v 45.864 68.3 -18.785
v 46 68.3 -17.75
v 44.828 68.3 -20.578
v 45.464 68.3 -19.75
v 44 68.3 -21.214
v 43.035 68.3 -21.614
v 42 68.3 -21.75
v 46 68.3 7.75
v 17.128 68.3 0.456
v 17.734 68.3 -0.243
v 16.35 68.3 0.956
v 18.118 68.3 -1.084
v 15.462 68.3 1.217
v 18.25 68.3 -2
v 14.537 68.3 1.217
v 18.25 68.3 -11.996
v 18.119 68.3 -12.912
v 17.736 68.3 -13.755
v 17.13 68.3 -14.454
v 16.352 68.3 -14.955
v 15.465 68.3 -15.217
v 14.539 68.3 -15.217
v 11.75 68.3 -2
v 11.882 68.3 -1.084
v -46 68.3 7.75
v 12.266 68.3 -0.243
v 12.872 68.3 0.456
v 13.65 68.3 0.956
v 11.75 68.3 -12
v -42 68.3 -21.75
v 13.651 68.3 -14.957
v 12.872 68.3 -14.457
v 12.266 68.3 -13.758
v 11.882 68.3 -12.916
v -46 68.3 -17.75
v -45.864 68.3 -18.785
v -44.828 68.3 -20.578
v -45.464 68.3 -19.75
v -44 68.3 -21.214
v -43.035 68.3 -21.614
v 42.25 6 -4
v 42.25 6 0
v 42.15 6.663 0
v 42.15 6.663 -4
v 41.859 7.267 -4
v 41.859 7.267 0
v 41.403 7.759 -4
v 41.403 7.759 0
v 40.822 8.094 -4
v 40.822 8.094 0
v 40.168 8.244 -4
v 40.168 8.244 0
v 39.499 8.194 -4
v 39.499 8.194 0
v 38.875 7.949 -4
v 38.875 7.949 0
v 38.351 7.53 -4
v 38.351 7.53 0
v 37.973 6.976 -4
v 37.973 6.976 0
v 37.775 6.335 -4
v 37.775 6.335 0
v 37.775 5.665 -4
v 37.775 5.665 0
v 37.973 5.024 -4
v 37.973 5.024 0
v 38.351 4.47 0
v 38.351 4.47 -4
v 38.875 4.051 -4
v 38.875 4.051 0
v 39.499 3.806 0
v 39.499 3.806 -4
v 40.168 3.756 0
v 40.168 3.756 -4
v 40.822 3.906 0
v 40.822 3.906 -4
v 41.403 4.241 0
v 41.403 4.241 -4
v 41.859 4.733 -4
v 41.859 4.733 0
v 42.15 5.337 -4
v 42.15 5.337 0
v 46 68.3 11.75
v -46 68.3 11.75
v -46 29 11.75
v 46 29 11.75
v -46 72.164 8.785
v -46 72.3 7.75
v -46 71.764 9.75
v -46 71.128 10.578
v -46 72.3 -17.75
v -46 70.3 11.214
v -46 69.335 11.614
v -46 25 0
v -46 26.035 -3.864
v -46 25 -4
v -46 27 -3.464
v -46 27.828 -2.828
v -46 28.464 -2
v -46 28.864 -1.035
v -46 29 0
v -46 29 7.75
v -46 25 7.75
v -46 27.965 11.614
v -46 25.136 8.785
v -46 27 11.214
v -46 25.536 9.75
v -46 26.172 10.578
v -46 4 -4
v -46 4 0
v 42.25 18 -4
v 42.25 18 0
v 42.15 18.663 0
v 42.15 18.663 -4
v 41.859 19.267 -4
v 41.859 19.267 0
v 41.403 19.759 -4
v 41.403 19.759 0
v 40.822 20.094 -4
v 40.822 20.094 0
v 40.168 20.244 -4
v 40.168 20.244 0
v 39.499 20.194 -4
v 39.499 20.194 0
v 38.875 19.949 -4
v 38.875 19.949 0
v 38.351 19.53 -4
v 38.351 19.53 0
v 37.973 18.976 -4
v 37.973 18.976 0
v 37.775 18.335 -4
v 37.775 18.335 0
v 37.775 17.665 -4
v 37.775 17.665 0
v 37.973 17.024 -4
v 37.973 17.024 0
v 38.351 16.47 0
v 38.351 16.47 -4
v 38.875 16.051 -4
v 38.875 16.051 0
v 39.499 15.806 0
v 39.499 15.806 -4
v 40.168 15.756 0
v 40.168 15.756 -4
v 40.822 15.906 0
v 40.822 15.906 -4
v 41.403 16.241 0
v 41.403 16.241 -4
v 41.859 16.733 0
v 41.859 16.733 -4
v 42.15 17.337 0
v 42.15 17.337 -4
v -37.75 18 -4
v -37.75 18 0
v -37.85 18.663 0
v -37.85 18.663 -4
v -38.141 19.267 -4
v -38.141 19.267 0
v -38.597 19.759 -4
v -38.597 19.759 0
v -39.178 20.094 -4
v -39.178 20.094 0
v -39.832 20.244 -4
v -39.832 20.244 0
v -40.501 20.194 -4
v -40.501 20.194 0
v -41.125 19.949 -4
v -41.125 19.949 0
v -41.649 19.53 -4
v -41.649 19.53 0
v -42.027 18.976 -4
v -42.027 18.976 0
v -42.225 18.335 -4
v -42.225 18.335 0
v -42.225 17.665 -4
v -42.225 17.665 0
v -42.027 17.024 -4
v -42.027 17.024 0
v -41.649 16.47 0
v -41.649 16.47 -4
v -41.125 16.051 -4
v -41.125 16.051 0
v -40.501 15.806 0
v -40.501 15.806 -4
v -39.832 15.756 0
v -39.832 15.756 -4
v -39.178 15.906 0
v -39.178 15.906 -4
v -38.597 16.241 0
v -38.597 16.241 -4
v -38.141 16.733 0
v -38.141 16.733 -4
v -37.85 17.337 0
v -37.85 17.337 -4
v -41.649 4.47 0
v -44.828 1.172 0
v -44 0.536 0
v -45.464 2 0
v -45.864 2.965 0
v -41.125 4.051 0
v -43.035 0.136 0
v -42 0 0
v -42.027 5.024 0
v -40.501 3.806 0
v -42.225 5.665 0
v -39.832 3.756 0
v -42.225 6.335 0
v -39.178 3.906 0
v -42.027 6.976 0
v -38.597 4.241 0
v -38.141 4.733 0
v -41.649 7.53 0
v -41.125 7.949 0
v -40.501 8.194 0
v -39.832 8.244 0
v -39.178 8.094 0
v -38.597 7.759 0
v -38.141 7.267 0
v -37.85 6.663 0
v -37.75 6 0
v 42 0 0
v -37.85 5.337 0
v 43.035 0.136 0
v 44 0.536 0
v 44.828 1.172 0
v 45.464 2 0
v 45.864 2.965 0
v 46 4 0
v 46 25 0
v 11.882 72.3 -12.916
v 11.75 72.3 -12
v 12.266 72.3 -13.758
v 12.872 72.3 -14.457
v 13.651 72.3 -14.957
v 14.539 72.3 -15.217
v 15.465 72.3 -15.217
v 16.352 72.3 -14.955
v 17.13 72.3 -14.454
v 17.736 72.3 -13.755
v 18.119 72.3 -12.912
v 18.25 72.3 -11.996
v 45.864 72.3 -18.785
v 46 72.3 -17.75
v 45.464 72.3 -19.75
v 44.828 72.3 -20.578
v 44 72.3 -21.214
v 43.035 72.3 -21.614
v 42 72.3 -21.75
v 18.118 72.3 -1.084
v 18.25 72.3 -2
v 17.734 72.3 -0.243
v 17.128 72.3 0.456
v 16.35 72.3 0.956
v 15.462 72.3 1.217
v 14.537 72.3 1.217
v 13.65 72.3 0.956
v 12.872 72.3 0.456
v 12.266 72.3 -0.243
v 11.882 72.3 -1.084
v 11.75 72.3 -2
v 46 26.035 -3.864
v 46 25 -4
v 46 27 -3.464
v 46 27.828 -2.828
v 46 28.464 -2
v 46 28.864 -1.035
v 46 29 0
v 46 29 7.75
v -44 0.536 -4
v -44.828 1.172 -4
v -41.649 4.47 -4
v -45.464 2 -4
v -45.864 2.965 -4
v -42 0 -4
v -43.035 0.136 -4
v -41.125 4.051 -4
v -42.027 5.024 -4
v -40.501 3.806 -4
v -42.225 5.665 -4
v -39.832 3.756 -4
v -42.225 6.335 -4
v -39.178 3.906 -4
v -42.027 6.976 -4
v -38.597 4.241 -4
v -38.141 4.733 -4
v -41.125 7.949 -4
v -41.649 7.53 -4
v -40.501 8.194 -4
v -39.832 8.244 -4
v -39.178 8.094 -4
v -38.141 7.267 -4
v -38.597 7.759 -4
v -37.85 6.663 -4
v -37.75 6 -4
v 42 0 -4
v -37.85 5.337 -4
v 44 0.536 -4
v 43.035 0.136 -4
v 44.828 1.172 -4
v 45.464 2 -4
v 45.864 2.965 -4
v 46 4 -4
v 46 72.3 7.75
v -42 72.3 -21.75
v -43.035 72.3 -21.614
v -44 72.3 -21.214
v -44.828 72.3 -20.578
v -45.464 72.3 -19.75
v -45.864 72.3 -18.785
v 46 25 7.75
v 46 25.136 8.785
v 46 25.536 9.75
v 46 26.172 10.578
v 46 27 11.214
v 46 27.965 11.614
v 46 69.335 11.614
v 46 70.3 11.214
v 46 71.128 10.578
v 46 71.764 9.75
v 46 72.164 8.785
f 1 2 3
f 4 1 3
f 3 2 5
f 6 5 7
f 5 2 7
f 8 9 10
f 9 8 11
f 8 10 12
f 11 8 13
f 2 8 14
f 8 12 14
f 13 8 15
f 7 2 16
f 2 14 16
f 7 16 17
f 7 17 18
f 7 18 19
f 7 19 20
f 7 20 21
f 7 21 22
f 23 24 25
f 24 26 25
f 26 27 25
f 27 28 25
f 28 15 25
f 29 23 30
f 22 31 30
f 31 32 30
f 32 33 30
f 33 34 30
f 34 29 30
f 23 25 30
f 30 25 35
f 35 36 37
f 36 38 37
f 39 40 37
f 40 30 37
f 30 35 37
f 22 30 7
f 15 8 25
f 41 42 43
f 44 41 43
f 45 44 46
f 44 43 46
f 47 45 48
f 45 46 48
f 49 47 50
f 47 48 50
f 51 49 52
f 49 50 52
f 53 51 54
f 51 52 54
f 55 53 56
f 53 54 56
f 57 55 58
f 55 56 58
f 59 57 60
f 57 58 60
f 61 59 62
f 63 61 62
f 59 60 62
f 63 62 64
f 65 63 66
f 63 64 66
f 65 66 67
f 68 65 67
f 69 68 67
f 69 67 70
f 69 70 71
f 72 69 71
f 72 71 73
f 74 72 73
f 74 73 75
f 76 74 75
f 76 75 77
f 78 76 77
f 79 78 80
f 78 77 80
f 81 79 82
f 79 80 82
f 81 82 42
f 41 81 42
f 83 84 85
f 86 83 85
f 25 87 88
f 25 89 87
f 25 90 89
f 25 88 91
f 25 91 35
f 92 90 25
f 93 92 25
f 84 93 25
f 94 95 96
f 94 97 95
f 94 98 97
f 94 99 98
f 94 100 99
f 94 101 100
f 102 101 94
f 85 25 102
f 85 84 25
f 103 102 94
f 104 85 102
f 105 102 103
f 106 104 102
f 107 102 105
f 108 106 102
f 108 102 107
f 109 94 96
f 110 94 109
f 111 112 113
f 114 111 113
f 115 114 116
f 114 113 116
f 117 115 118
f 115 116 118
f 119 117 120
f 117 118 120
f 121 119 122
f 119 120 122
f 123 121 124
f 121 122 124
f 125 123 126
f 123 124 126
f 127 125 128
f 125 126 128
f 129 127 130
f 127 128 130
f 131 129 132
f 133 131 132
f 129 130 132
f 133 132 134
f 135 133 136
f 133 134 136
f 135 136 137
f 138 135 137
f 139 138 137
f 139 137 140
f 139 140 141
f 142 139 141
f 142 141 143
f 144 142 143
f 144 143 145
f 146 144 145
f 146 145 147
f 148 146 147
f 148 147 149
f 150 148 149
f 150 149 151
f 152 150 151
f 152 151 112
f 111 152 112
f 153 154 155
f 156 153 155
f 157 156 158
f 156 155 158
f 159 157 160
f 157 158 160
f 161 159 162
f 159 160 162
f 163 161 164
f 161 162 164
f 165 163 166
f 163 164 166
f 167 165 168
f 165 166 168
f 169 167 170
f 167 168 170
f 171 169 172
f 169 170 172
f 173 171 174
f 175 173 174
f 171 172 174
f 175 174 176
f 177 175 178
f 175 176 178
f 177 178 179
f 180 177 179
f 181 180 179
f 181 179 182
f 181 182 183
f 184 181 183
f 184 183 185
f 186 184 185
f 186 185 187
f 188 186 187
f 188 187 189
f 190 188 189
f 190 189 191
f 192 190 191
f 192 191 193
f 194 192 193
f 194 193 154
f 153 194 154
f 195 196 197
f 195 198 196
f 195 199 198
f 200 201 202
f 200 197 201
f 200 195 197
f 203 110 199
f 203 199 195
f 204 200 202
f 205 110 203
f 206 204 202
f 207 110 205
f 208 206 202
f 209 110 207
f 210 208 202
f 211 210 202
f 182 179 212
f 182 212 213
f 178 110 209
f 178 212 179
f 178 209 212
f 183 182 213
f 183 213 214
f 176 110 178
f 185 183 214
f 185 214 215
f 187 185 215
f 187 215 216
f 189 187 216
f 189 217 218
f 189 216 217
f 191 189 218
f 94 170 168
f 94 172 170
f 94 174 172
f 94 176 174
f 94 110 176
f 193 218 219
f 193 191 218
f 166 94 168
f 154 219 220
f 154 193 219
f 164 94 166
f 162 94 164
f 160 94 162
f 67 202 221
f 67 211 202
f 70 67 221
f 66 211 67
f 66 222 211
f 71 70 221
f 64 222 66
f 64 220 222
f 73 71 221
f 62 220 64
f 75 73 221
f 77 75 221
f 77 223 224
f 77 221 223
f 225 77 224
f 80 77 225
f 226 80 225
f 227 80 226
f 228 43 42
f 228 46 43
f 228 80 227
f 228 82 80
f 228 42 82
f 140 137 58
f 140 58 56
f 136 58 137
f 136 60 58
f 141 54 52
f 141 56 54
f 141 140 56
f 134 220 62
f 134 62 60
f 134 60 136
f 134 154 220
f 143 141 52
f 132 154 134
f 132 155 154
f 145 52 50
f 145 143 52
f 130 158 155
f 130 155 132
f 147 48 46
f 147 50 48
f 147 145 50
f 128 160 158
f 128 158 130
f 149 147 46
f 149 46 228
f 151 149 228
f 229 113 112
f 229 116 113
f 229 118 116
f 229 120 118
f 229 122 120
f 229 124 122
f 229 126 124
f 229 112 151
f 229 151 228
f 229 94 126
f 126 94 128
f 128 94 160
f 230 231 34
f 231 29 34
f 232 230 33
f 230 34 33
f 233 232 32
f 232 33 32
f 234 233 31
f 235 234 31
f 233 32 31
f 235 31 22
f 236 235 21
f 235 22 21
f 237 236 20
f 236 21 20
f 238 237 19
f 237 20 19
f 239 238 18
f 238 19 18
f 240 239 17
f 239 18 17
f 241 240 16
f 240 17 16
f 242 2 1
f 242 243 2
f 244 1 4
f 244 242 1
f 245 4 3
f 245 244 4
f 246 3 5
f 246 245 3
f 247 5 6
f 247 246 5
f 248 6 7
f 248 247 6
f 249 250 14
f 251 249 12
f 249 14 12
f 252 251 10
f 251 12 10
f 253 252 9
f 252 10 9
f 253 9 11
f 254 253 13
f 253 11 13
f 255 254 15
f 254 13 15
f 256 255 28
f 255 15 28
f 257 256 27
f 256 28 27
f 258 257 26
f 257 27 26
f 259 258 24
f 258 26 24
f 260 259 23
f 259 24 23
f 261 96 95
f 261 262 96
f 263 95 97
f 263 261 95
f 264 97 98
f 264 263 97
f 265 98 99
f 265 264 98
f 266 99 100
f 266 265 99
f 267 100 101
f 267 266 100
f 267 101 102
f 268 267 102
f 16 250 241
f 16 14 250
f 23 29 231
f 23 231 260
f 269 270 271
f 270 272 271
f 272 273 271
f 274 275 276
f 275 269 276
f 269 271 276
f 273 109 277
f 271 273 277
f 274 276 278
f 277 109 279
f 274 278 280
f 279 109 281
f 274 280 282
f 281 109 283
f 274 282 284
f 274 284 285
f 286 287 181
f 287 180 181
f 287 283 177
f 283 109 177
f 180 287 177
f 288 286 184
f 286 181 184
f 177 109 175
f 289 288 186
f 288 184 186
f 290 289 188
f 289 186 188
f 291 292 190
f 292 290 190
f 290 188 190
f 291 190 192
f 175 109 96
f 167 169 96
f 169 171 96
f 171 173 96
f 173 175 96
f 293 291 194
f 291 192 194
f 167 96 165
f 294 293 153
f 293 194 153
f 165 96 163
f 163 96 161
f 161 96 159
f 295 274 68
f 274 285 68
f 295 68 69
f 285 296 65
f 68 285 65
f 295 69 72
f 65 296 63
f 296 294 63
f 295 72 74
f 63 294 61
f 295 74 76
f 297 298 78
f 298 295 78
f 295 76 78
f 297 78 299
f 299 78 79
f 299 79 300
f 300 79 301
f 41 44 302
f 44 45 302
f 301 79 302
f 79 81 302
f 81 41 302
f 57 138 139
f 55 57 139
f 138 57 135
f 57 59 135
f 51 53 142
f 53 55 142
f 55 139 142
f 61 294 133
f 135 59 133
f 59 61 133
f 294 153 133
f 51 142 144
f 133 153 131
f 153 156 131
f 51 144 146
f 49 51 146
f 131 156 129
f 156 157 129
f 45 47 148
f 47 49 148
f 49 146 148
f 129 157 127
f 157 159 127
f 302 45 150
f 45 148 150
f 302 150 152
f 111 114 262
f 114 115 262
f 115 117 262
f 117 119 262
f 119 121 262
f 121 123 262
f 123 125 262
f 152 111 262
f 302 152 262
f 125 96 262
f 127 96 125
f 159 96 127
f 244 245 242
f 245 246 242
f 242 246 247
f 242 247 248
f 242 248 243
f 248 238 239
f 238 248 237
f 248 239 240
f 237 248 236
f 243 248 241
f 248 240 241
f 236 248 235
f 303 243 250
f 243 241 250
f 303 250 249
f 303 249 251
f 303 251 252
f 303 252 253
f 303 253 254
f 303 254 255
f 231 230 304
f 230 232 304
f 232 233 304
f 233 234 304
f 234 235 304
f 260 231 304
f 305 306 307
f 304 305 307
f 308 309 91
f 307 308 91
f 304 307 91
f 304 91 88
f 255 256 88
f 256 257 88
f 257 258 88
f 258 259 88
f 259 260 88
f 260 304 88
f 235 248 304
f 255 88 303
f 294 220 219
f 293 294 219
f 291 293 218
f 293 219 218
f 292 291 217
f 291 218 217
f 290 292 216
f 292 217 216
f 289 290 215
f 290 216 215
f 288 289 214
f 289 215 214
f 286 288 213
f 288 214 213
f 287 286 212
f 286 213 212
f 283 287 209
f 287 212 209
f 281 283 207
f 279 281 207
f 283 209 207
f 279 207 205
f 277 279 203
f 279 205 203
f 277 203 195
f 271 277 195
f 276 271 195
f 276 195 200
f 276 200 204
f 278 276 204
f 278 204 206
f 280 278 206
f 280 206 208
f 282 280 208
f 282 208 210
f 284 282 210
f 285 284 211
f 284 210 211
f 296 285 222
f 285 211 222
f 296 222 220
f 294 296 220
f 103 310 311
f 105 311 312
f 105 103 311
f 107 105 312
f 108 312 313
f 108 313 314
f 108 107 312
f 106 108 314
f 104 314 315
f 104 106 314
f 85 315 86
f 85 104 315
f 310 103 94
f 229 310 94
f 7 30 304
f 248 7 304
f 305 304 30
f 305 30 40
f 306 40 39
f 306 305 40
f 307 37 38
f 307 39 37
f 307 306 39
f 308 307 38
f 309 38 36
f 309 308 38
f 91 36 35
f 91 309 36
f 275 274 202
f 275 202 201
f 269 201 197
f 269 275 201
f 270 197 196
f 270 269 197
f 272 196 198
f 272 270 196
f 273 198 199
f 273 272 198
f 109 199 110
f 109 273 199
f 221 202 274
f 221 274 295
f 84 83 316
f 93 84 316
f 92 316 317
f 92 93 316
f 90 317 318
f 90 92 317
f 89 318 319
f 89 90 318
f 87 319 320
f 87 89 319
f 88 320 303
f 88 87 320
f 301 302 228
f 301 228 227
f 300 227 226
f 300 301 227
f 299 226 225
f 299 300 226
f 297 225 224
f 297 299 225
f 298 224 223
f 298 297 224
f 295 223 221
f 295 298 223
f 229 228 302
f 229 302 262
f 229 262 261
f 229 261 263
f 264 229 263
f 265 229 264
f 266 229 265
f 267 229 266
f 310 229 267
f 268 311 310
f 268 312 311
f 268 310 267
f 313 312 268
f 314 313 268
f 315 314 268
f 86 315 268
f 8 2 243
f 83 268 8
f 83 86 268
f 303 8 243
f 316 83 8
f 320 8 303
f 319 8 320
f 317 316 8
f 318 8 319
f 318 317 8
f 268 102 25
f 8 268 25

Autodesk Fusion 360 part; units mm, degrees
sketch "Sketch5" plane through (0, 0, 0) normal (0, 0, 1) x (1, 0, 0)
  line L0 (-40, 6) -> (40, 6) construction
  line L1 (40, 6) -> (40, 18) construction
  line L2 (40, 18) -> (-40, 18) construction
  line L3 (-40, 18) -> (-40, 6) construction
  circle A0 centre (-40, 18) radius 2.25
  circle A1 centre (-40, 6) radius 2.25
  circle A2 centre (40, 18) radius 2.25
  circle A3 centre (40, 6) radius 2.25
  line L4 (46, 24) -> (-46, 24)
  line L5 (-46, 24) -> (-46, 0)
  line L6 (-46, 0) -> (46, 0)
  line L7 (46, 0) -> (46, 24)
  line L8 (46, 24) -> (46, 25)
  line L9 (46, 25) -> (-46, 25)
  line L10 (-46, 25) -> (-46, 24)
  dimension "d20" = 80
  dimension "d21" = 12
  dimension "d22" = 4.5
  dimension "d42" = 6
  dimension "d56" = 92
  dimension "d70" = 1
  dimension "d71" = 25
extrude "Extrude6" add sketch "Sketch5" against normal blind 4
sketch "Sketch9" plane through (0, 0, 0) normal (1, 0, 0) x (0, 1, 0)
  line L0 (25, -4) -> (29, -4)
  line L1 (29, -4) -> (29, 7.75)
  line L2 (29, 7.75) -> (68.3, 7.75)
  line L3 (68.3, 7.75) -> (68.3, -21.75)
  line L4 (68.3, -21.75) -> (72.3, -21.75)
  line L5 (72.3, -21.75) -> (72.3, 11.75)
  line L6 (72.3, 11.75) -> (25, 11.75)
  line L7 (25, 11.75) -> (25, 0)
  line L8 (25, 0) -> (29, 0) construction
  line L9 (48.65, 7.75) -> (48.65, 11.75) construction
  line L10 (25, 0) -> (25, -4)
  line L11 (25, -4) -> (25, 0)
  line L12 (0, 0) -> (25, 0)
  line L13 (25, 0) -> (25, -4)
  line L14 (25, -4) -> (0, -4)
  line L15 (0, -4) -> (0, 0)
  point P0 (68.3, -7)
  dimension "d52" = 7
  dimension "d53" = 14.75
  dimension "d55" = 14.75
  dimension "d72" = 72.3
extrude "Extrude7" add sketch "Sketch9" along normal mid plane 92 contours L0 L1 L2 L3 L4 L5 L6 L7 L10 L11 L13
fillet "Fillet3" radius 4 7 edges at (46, 70.3, -21.75) (-46, 70.3, -21.75) (0, 72.3, 11.75) (0, 25, 11.75) (0, 29, -4) (-46, 0, -2) (46, 0, -2)
sketch "Sketch10" plane through (0, 0, 0) normal (0, 1, 0) x (1, 0, 0)
  line L0 (15, 2) -> (15, 12) construction
  arc A0 (18.25, 11.9963) -> (11.75, 12) centre (15, 12) ccw
  arc A1 (11.75, 2.0001) -> (18.25, 2) centre (15, 2) ccw
  line L1 (11.75, 12) -> (11.75, 2.0001)
  line L2 (18.25, 2) -> (18.25, 11.9963)
  line L3 (15, 7) -> (0, 7) construction
  point P0 (0, 7)
  dimension "d63" = 10
  dimension "d64" = 3.25
  dimension "d68" = 15
extrude "Extrude8" cut sketch "Sketch10" along normal through all from surface at 68.3
equation "Thickness = 4 mm"
equation "d47 = -Thickness"
equation "d52 = ( MountHoleSpacing - 148 mm ) / 2"
equation "d53 = ( ( MountHoleTolerance + MountHoleSize ) / 2 ) + MountHoleSize"
equation "d55 = d53"
equation "d57 = d56"
equation "d60 = Thickness"
equation "MountHoleSpacing = 162 mm"
equation "MountHoleTolerance = 10 mm"
equation "d63 = MountHoleTolerance"
equation "d64 = ( 6.5 / 2 ) * 1 mm"
equation "MountHoleSize = 6.5 mm"
equation "SurfaceOffset = 30 mm"
equation "d72 = 42.3 mm + SurfaceOffset"
